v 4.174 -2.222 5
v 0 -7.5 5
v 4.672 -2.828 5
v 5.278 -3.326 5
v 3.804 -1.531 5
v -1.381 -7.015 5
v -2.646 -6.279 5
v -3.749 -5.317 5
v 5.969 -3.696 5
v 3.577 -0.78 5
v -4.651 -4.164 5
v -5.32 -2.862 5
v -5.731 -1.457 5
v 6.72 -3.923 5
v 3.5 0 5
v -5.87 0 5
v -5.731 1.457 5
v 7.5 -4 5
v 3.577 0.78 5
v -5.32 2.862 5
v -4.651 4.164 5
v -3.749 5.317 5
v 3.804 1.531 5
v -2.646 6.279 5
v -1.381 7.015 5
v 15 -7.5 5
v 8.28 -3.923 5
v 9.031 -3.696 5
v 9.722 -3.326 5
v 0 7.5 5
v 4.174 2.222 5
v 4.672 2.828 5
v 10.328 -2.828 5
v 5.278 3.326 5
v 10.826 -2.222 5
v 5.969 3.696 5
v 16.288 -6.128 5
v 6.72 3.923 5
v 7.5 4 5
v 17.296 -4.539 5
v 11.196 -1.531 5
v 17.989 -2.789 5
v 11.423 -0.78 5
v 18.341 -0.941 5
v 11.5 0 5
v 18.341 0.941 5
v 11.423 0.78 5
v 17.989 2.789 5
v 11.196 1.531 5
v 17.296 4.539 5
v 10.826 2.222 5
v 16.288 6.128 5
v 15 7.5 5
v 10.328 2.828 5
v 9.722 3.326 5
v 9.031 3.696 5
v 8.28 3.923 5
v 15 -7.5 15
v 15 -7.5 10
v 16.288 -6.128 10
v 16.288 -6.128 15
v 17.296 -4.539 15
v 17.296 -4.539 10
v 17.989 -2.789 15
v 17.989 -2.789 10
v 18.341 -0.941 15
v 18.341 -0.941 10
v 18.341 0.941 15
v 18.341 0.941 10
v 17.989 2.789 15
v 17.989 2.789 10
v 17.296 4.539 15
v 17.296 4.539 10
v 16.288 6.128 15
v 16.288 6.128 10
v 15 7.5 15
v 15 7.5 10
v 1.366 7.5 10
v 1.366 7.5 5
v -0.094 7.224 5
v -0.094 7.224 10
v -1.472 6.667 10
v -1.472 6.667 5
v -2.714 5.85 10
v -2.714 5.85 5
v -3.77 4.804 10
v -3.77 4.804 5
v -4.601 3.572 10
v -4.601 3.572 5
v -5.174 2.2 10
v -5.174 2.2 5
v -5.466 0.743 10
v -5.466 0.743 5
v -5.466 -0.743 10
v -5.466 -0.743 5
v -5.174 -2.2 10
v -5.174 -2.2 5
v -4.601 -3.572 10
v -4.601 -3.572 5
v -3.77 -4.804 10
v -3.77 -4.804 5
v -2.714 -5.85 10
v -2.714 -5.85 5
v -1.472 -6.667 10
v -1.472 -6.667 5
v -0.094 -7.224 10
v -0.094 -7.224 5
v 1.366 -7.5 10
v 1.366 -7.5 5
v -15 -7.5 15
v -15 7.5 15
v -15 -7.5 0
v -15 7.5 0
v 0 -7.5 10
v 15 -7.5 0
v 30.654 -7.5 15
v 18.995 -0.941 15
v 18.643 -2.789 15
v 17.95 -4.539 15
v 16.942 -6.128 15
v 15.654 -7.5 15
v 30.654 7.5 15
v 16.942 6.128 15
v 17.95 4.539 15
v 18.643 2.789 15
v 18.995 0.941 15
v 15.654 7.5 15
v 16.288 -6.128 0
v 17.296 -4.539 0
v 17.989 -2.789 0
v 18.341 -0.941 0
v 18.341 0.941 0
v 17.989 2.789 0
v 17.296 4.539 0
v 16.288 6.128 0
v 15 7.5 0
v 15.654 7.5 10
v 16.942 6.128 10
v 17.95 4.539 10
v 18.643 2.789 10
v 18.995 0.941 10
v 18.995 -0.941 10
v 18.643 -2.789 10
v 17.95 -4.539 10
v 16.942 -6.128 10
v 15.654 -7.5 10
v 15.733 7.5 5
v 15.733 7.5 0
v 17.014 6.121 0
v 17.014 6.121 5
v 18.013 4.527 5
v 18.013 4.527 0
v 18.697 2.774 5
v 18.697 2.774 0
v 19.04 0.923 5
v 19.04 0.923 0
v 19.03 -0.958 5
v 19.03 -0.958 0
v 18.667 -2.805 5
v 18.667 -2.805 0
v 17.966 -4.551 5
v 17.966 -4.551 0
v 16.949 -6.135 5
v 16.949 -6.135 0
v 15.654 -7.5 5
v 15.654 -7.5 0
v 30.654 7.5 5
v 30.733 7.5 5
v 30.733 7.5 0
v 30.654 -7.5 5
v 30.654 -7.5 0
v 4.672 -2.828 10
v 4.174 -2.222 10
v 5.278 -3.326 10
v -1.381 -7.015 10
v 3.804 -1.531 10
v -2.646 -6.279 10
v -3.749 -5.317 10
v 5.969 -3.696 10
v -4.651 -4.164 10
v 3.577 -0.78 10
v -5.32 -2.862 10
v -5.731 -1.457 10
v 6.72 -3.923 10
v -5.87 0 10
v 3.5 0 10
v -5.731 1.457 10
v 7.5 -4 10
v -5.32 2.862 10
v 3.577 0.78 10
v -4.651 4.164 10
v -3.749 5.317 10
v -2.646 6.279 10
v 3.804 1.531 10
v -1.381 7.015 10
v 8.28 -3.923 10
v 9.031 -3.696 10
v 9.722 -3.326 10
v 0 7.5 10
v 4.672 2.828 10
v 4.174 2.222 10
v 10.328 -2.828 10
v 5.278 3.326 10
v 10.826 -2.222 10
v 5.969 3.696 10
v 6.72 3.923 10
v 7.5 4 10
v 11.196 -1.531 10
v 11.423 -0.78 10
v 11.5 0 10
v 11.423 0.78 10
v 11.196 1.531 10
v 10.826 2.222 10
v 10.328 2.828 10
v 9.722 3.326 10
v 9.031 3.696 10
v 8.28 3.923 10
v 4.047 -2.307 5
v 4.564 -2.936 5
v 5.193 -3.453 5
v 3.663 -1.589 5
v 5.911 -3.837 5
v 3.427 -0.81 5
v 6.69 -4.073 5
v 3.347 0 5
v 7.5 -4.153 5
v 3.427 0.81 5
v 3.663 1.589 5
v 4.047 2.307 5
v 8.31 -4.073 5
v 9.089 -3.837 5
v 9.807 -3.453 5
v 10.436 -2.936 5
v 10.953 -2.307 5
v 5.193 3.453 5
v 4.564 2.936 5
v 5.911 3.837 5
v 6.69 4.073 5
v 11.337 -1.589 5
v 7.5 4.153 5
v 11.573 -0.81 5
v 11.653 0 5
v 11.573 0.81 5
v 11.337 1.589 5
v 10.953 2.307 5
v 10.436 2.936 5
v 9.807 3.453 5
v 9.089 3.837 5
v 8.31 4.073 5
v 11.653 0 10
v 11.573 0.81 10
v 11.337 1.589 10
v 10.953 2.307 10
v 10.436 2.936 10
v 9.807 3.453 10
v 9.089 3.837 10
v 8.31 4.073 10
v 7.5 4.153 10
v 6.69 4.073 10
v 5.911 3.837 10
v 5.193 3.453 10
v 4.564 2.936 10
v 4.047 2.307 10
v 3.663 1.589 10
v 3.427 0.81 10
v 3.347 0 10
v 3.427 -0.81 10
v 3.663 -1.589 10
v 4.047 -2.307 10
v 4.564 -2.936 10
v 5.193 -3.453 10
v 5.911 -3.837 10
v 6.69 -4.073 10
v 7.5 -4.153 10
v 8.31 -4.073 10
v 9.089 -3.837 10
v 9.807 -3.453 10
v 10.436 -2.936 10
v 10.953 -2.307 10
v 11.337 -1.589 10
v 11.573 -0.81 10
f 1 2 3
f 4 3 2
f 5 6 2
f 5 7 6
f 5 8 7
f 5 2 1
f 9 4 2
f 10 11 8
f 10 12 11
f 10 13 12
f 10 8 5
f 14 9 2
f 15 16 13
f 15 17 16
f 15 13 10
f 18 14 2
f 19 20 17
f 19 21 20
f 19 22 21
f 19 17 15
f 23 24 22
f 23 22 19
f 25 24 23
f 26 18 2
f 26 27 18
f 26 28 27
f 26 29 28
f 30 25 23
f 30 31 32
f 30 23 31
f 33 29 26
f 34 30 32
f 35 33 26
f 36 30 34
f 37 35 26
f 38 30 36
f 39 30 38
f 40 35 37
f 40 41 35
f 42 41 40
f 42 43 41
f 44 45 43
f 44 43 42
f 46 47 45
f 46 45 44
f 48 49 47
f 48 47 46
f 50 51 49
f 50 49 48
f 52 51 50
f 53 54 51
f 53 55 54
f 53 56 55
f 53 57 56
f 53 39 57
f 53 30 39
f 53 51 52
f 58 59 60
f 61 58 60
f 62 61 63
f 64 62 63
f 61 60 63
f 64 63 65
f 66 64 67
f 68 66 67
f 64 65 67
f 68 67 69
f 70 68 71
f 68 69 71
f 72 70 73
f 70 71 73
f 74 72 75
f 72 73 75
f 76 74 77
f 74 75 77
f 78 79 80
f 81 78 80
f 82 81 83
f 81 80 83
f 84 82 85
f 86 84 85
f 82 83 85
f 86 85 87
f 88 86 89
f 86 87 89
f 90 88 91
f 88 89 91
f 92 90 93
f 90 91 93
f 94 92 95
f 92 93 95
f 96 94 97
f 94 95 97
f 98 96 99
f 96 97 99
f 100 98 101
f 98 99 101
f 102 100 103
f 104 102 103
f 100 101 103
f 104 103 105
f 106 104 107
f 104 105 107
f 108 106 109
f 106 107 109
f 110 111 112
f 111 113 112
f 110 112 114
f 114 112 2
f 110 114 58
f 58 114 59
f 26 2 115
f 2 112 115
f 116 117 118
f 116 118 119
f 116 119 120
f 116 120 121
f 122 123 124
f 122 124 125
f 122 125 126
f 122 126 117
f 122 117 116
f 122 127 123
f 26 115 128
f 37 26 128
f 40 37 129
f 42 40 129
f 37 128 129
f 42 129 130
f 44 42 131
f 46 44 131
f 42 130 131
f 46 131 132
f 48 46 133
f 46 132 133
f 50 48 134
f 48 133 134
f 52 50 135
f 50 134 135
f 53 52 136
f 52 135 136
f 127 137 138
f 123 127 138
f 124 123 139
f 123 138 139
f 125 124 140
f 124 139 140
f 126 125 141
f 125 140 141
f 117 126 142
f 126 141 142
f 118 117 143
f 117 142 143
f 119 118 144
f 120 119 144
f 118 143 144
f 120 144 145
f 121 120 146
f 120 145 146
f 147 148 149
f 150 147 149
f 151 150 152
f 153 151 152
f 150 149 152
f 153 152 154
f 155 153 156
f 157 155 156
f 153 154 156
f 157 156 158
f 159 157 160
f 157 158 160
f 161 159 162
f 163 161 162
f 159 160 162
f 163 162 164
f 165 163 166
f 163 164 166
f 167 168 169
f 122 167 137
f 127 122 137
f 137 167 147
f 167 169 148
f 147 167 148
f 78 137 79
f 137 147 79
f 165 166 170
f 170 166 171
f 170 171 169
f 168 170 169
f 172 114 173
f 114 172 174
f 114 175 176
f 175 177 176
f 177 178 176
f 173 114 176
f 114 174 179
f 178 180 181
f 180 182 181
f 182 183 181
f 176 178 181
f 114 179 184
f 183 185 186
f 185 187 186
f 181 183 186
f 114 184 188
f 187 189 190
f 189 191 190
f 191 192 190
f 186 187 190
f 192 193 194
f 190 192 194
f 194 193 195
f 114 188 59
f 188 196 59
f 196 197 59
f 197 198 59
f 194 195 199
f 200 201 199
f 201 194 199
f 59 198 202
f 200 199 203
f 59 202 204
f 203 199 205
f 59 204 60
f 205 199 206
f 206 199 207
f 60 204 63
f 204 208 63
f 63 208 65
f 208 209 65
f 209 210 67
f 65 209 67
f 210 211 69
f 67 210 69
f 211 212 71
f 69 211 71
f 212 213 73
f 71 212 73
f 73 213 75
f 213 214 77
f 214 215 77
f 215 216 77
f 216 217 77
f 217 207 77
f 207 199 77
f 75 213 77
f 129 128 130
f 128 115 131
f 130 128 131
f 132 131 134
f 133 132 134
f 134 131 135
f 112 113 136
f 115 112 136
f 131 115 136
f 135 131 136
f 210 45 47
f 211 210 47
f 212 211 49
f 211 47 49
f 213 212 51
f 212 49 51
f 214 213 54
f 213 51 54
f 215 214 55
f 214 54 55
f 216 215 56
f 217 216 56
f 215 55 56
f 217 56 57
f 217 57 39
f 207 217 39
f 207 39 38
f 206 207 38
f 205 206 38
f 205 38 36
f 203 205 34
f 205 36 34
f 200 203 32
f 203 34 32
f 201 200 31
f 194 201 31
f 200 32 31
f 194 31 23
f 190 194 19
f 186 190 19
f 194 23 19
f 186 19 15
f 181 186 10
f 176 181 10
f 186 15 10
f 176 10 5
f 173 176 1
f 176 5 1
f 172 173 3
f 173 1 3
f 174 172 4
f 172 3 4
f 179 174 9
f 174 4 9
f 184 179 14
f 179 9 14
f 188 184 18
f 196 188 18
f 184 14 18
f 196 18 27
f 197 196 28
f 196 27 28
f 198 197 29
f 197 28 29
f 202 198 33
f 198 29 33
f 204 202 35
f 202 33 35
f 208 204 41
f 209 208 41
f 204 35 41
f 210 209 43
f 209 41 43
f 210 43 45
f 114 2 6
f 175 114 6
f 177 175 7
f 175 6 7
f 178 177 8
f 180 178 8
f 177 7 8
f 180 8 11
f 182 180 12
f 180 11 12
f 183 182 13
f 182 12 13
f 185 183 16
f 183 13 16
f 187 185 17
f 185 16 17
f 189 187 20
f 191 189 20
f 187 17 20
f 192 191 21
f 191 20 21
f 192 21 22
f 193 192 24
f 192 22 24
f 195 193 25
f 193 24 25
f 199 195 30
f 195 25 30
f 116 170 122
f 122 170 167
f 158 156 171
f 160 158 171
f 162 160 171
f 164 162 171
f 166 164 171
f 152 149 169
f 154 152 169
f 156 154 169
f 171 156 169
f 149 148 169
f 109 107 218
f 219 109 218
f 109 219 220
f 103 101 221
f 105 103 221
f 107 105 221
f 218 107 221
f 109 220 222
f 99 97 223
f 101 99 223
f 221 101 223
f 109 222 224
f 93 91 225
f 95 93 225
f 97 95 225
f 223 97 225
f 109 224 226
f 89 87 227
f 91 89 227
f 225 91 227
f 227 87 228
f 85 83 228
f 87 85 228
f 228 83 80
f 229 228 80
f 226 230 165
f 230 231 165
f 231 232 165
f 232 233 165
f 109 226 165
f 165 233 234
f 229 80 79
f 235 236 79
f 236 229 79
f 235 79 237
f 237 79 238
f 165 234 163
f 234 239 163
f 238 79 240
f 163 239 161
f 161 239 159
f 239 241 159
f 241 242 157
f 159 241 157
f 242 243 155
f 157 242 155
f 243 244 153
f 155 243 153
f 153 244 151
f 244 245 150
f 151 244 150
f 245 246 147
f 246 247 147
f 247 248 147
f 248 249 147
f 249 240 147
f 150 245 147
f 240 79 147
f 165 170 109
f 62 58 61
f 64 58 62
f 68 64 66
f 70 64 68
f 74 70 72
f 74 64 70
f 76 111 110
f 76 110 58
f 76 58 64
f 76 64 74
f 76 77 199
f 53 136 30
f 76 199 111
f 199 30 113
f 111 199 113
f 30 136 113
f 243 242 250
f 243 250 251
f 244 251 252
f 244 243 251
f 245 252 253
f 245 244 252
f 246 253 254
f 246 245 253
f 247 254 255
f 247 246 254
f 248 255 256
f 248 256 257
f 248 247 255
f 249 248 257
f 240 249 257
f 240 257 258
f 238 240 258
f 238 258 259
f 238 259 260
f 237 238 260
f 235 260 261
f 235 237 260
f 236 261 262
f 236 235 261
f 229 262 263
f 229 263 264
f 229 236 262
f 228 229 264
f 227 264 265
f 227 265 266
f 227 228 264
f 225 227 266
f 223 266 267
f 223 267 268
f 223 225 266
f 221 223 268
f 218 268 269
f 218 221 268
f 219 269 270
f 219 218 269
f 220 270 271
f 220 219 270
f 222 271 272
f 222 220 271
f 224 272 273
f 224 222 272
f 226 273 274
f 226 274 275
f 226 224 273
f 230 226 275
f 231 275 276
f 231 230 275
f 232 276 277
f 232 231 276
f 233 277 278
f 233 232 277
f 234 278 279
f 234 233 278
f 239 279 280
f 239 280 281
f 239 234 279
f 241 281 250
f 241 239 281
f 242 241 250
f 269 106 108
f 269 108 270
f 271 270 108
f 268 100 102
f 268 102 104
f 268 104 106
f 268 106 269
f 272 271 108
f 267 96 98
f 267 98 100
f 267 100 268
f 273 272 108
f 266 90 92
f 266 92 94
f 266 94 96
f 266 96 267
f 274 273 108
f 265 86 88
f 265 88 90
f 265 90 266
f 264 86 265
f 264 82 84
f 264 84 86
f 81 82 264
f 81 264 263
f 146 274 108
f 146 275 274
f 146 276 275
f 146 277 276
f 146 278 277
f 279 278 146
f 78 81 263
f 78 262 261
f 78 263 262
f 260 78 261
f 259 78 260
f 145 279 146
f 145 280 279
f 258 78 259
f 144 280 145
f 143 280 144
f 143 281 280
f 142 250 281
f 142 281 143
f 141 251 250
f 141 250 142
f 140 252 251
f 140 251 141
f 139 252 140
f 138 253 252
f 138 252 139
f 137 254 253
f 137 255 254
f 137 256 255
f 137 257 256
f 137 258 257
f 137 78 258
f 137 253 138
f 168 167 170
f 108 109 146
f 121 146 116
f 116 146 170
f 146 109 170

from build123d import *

# Parameters (mm, degrees)
F1_DEPTH = 5
F2_R     = 4
F3_DEPTH = 5
F2_R_2   = 4.1526486357
F4_DEPTH = 5
F6_DEPTH = 5
F7_DEPTH = 5


with BuildPart() as f1:
    # F0 (on Top) → F1 (new body)
    with BuildSketch(Plane.XY):
        with BuildLine():
            Line((15, 7.5), (-15, 7.5))
            Line((-15, 7.5), (-15, -7.5))
            Line((-15, -7.5), (15, -7.5))
            ThreePointArc((15, -7.5), (18.3856217223, 0), (15, 7.5))
        make_face()
    extrude(amount=F1_DEPTH)

    # F2 (on face) → F3 (join)
    with BuildSketch(Plane.XY.offset(5)):
        with BuildLine():
            Line((0, 7.5), (-15, 7.5))
            Line((-15, 7.5), (-15, -7.5))
            Line((-15, -7.5), (0, -7.5))
            ThreePointArc((0, -7.5), (-5.8695986214, 0), (0, 7.5))
        make_face()
        with Locations((7.5, 0)):
            Circle(F2_R)
    extrude(amount=F3_DEPTH)

    # F5 (on face) → F7 (join)
    with BuildSketch(Plane.XY.offset(10)):
        with BuildLine():
            ThreePointArc((15, -7.5), (18.3856217223, 0), (15, 7.5))
            Line((15, 7.5), (0, 7.5))
            ThreePointArc((0, 7.5), (-5.8695986214, 0), (0, -7.5))
            Line((0, -7.5), (15, -7.5))
        make_face()
        with BuildLine():
            ThreePointArc((0, -7.5), (-5.8695986214, 0), (0, 7.5))
            Line((0, 7.5), (-15, 7.5))
            Line((-15, 7.5), (-15, -7.5))
            Line((-15, -7.5), (0, -7.5))
        make_face()
    extrude(amount=F7_DEPTH)


with BuildPart() as f1b:
    # F0 (on Top) → F1, piece 2 (new body)
    with BuildSketch(Plane.XY):
        with BuildLine():
            Line((30.7328099012, 7.5), (15.7328099012, 7.5))
            ThreePointArc((15.7328099012, 7.5), (19.078910202, -0.0177155588), (15.6538608473, -7.4997922335))
            Line((15.6538608473, -7.4997922335), (30.6538608473, -7.4997922335))
            Line((30.6538608473, -7.4997922335), (30.7328099012, 7.5))
        make_face()
    extrude(amount=F1_DEPTH)

    # F2 (on face) → F4 (join)
    with BuildSketch(Plane.XY.offset(5)):
        with BuildLine():
            Line((15, 7.5), (1.3659824617, 7.5))
            ThreePointArc((1.3659824617, 7.5), (-5.5026358727, 0), (1.3659824617, -7.5))
            Line((1.3659824617, -7.5), (15, -7.5))
            ThreePointArc((15, -7.5), (18.3856217223, 0), (15, 7.5))
        make_face()
        with Locations((7.5, 0)):
            Circle(F2_R_2, mode=Mode.SUBTRACT)
        with BuildLine():
            Line((30.6538597538, 7.5), (15, 7.5))
            ThreePointArc((15, 7.5), (18.3856217223, 0), (15, -7.5))
            Line((15, -7.5), (30.6538597538, -7.5))
            Line((30.6538597538, -7.5), (30.6538597538, 7.5))
        make_face()
    extrude(amount=F4_DEPTH)

    # F5 (on face) → F6 (join)
    with BuildSketch(Plane.XY.offset(10)):
        with BuildLine():
            Line((30.6538597538, 7.5), (15.6538597538, 7.5))
            ThreePointArc((15.6538597538, 7.5), (19.0394814761, 0), (15.6538597538, -7.5))
            Line((15.6538597538, -7.5), (30.6538597538, -7.5))
            Line((30.6538597538, -7.5), (30.6538597538, 7.5))
        make_face()
    extrude(amount=F6_DEPTH)


solid = Compound([f1.part, f1b.part])
